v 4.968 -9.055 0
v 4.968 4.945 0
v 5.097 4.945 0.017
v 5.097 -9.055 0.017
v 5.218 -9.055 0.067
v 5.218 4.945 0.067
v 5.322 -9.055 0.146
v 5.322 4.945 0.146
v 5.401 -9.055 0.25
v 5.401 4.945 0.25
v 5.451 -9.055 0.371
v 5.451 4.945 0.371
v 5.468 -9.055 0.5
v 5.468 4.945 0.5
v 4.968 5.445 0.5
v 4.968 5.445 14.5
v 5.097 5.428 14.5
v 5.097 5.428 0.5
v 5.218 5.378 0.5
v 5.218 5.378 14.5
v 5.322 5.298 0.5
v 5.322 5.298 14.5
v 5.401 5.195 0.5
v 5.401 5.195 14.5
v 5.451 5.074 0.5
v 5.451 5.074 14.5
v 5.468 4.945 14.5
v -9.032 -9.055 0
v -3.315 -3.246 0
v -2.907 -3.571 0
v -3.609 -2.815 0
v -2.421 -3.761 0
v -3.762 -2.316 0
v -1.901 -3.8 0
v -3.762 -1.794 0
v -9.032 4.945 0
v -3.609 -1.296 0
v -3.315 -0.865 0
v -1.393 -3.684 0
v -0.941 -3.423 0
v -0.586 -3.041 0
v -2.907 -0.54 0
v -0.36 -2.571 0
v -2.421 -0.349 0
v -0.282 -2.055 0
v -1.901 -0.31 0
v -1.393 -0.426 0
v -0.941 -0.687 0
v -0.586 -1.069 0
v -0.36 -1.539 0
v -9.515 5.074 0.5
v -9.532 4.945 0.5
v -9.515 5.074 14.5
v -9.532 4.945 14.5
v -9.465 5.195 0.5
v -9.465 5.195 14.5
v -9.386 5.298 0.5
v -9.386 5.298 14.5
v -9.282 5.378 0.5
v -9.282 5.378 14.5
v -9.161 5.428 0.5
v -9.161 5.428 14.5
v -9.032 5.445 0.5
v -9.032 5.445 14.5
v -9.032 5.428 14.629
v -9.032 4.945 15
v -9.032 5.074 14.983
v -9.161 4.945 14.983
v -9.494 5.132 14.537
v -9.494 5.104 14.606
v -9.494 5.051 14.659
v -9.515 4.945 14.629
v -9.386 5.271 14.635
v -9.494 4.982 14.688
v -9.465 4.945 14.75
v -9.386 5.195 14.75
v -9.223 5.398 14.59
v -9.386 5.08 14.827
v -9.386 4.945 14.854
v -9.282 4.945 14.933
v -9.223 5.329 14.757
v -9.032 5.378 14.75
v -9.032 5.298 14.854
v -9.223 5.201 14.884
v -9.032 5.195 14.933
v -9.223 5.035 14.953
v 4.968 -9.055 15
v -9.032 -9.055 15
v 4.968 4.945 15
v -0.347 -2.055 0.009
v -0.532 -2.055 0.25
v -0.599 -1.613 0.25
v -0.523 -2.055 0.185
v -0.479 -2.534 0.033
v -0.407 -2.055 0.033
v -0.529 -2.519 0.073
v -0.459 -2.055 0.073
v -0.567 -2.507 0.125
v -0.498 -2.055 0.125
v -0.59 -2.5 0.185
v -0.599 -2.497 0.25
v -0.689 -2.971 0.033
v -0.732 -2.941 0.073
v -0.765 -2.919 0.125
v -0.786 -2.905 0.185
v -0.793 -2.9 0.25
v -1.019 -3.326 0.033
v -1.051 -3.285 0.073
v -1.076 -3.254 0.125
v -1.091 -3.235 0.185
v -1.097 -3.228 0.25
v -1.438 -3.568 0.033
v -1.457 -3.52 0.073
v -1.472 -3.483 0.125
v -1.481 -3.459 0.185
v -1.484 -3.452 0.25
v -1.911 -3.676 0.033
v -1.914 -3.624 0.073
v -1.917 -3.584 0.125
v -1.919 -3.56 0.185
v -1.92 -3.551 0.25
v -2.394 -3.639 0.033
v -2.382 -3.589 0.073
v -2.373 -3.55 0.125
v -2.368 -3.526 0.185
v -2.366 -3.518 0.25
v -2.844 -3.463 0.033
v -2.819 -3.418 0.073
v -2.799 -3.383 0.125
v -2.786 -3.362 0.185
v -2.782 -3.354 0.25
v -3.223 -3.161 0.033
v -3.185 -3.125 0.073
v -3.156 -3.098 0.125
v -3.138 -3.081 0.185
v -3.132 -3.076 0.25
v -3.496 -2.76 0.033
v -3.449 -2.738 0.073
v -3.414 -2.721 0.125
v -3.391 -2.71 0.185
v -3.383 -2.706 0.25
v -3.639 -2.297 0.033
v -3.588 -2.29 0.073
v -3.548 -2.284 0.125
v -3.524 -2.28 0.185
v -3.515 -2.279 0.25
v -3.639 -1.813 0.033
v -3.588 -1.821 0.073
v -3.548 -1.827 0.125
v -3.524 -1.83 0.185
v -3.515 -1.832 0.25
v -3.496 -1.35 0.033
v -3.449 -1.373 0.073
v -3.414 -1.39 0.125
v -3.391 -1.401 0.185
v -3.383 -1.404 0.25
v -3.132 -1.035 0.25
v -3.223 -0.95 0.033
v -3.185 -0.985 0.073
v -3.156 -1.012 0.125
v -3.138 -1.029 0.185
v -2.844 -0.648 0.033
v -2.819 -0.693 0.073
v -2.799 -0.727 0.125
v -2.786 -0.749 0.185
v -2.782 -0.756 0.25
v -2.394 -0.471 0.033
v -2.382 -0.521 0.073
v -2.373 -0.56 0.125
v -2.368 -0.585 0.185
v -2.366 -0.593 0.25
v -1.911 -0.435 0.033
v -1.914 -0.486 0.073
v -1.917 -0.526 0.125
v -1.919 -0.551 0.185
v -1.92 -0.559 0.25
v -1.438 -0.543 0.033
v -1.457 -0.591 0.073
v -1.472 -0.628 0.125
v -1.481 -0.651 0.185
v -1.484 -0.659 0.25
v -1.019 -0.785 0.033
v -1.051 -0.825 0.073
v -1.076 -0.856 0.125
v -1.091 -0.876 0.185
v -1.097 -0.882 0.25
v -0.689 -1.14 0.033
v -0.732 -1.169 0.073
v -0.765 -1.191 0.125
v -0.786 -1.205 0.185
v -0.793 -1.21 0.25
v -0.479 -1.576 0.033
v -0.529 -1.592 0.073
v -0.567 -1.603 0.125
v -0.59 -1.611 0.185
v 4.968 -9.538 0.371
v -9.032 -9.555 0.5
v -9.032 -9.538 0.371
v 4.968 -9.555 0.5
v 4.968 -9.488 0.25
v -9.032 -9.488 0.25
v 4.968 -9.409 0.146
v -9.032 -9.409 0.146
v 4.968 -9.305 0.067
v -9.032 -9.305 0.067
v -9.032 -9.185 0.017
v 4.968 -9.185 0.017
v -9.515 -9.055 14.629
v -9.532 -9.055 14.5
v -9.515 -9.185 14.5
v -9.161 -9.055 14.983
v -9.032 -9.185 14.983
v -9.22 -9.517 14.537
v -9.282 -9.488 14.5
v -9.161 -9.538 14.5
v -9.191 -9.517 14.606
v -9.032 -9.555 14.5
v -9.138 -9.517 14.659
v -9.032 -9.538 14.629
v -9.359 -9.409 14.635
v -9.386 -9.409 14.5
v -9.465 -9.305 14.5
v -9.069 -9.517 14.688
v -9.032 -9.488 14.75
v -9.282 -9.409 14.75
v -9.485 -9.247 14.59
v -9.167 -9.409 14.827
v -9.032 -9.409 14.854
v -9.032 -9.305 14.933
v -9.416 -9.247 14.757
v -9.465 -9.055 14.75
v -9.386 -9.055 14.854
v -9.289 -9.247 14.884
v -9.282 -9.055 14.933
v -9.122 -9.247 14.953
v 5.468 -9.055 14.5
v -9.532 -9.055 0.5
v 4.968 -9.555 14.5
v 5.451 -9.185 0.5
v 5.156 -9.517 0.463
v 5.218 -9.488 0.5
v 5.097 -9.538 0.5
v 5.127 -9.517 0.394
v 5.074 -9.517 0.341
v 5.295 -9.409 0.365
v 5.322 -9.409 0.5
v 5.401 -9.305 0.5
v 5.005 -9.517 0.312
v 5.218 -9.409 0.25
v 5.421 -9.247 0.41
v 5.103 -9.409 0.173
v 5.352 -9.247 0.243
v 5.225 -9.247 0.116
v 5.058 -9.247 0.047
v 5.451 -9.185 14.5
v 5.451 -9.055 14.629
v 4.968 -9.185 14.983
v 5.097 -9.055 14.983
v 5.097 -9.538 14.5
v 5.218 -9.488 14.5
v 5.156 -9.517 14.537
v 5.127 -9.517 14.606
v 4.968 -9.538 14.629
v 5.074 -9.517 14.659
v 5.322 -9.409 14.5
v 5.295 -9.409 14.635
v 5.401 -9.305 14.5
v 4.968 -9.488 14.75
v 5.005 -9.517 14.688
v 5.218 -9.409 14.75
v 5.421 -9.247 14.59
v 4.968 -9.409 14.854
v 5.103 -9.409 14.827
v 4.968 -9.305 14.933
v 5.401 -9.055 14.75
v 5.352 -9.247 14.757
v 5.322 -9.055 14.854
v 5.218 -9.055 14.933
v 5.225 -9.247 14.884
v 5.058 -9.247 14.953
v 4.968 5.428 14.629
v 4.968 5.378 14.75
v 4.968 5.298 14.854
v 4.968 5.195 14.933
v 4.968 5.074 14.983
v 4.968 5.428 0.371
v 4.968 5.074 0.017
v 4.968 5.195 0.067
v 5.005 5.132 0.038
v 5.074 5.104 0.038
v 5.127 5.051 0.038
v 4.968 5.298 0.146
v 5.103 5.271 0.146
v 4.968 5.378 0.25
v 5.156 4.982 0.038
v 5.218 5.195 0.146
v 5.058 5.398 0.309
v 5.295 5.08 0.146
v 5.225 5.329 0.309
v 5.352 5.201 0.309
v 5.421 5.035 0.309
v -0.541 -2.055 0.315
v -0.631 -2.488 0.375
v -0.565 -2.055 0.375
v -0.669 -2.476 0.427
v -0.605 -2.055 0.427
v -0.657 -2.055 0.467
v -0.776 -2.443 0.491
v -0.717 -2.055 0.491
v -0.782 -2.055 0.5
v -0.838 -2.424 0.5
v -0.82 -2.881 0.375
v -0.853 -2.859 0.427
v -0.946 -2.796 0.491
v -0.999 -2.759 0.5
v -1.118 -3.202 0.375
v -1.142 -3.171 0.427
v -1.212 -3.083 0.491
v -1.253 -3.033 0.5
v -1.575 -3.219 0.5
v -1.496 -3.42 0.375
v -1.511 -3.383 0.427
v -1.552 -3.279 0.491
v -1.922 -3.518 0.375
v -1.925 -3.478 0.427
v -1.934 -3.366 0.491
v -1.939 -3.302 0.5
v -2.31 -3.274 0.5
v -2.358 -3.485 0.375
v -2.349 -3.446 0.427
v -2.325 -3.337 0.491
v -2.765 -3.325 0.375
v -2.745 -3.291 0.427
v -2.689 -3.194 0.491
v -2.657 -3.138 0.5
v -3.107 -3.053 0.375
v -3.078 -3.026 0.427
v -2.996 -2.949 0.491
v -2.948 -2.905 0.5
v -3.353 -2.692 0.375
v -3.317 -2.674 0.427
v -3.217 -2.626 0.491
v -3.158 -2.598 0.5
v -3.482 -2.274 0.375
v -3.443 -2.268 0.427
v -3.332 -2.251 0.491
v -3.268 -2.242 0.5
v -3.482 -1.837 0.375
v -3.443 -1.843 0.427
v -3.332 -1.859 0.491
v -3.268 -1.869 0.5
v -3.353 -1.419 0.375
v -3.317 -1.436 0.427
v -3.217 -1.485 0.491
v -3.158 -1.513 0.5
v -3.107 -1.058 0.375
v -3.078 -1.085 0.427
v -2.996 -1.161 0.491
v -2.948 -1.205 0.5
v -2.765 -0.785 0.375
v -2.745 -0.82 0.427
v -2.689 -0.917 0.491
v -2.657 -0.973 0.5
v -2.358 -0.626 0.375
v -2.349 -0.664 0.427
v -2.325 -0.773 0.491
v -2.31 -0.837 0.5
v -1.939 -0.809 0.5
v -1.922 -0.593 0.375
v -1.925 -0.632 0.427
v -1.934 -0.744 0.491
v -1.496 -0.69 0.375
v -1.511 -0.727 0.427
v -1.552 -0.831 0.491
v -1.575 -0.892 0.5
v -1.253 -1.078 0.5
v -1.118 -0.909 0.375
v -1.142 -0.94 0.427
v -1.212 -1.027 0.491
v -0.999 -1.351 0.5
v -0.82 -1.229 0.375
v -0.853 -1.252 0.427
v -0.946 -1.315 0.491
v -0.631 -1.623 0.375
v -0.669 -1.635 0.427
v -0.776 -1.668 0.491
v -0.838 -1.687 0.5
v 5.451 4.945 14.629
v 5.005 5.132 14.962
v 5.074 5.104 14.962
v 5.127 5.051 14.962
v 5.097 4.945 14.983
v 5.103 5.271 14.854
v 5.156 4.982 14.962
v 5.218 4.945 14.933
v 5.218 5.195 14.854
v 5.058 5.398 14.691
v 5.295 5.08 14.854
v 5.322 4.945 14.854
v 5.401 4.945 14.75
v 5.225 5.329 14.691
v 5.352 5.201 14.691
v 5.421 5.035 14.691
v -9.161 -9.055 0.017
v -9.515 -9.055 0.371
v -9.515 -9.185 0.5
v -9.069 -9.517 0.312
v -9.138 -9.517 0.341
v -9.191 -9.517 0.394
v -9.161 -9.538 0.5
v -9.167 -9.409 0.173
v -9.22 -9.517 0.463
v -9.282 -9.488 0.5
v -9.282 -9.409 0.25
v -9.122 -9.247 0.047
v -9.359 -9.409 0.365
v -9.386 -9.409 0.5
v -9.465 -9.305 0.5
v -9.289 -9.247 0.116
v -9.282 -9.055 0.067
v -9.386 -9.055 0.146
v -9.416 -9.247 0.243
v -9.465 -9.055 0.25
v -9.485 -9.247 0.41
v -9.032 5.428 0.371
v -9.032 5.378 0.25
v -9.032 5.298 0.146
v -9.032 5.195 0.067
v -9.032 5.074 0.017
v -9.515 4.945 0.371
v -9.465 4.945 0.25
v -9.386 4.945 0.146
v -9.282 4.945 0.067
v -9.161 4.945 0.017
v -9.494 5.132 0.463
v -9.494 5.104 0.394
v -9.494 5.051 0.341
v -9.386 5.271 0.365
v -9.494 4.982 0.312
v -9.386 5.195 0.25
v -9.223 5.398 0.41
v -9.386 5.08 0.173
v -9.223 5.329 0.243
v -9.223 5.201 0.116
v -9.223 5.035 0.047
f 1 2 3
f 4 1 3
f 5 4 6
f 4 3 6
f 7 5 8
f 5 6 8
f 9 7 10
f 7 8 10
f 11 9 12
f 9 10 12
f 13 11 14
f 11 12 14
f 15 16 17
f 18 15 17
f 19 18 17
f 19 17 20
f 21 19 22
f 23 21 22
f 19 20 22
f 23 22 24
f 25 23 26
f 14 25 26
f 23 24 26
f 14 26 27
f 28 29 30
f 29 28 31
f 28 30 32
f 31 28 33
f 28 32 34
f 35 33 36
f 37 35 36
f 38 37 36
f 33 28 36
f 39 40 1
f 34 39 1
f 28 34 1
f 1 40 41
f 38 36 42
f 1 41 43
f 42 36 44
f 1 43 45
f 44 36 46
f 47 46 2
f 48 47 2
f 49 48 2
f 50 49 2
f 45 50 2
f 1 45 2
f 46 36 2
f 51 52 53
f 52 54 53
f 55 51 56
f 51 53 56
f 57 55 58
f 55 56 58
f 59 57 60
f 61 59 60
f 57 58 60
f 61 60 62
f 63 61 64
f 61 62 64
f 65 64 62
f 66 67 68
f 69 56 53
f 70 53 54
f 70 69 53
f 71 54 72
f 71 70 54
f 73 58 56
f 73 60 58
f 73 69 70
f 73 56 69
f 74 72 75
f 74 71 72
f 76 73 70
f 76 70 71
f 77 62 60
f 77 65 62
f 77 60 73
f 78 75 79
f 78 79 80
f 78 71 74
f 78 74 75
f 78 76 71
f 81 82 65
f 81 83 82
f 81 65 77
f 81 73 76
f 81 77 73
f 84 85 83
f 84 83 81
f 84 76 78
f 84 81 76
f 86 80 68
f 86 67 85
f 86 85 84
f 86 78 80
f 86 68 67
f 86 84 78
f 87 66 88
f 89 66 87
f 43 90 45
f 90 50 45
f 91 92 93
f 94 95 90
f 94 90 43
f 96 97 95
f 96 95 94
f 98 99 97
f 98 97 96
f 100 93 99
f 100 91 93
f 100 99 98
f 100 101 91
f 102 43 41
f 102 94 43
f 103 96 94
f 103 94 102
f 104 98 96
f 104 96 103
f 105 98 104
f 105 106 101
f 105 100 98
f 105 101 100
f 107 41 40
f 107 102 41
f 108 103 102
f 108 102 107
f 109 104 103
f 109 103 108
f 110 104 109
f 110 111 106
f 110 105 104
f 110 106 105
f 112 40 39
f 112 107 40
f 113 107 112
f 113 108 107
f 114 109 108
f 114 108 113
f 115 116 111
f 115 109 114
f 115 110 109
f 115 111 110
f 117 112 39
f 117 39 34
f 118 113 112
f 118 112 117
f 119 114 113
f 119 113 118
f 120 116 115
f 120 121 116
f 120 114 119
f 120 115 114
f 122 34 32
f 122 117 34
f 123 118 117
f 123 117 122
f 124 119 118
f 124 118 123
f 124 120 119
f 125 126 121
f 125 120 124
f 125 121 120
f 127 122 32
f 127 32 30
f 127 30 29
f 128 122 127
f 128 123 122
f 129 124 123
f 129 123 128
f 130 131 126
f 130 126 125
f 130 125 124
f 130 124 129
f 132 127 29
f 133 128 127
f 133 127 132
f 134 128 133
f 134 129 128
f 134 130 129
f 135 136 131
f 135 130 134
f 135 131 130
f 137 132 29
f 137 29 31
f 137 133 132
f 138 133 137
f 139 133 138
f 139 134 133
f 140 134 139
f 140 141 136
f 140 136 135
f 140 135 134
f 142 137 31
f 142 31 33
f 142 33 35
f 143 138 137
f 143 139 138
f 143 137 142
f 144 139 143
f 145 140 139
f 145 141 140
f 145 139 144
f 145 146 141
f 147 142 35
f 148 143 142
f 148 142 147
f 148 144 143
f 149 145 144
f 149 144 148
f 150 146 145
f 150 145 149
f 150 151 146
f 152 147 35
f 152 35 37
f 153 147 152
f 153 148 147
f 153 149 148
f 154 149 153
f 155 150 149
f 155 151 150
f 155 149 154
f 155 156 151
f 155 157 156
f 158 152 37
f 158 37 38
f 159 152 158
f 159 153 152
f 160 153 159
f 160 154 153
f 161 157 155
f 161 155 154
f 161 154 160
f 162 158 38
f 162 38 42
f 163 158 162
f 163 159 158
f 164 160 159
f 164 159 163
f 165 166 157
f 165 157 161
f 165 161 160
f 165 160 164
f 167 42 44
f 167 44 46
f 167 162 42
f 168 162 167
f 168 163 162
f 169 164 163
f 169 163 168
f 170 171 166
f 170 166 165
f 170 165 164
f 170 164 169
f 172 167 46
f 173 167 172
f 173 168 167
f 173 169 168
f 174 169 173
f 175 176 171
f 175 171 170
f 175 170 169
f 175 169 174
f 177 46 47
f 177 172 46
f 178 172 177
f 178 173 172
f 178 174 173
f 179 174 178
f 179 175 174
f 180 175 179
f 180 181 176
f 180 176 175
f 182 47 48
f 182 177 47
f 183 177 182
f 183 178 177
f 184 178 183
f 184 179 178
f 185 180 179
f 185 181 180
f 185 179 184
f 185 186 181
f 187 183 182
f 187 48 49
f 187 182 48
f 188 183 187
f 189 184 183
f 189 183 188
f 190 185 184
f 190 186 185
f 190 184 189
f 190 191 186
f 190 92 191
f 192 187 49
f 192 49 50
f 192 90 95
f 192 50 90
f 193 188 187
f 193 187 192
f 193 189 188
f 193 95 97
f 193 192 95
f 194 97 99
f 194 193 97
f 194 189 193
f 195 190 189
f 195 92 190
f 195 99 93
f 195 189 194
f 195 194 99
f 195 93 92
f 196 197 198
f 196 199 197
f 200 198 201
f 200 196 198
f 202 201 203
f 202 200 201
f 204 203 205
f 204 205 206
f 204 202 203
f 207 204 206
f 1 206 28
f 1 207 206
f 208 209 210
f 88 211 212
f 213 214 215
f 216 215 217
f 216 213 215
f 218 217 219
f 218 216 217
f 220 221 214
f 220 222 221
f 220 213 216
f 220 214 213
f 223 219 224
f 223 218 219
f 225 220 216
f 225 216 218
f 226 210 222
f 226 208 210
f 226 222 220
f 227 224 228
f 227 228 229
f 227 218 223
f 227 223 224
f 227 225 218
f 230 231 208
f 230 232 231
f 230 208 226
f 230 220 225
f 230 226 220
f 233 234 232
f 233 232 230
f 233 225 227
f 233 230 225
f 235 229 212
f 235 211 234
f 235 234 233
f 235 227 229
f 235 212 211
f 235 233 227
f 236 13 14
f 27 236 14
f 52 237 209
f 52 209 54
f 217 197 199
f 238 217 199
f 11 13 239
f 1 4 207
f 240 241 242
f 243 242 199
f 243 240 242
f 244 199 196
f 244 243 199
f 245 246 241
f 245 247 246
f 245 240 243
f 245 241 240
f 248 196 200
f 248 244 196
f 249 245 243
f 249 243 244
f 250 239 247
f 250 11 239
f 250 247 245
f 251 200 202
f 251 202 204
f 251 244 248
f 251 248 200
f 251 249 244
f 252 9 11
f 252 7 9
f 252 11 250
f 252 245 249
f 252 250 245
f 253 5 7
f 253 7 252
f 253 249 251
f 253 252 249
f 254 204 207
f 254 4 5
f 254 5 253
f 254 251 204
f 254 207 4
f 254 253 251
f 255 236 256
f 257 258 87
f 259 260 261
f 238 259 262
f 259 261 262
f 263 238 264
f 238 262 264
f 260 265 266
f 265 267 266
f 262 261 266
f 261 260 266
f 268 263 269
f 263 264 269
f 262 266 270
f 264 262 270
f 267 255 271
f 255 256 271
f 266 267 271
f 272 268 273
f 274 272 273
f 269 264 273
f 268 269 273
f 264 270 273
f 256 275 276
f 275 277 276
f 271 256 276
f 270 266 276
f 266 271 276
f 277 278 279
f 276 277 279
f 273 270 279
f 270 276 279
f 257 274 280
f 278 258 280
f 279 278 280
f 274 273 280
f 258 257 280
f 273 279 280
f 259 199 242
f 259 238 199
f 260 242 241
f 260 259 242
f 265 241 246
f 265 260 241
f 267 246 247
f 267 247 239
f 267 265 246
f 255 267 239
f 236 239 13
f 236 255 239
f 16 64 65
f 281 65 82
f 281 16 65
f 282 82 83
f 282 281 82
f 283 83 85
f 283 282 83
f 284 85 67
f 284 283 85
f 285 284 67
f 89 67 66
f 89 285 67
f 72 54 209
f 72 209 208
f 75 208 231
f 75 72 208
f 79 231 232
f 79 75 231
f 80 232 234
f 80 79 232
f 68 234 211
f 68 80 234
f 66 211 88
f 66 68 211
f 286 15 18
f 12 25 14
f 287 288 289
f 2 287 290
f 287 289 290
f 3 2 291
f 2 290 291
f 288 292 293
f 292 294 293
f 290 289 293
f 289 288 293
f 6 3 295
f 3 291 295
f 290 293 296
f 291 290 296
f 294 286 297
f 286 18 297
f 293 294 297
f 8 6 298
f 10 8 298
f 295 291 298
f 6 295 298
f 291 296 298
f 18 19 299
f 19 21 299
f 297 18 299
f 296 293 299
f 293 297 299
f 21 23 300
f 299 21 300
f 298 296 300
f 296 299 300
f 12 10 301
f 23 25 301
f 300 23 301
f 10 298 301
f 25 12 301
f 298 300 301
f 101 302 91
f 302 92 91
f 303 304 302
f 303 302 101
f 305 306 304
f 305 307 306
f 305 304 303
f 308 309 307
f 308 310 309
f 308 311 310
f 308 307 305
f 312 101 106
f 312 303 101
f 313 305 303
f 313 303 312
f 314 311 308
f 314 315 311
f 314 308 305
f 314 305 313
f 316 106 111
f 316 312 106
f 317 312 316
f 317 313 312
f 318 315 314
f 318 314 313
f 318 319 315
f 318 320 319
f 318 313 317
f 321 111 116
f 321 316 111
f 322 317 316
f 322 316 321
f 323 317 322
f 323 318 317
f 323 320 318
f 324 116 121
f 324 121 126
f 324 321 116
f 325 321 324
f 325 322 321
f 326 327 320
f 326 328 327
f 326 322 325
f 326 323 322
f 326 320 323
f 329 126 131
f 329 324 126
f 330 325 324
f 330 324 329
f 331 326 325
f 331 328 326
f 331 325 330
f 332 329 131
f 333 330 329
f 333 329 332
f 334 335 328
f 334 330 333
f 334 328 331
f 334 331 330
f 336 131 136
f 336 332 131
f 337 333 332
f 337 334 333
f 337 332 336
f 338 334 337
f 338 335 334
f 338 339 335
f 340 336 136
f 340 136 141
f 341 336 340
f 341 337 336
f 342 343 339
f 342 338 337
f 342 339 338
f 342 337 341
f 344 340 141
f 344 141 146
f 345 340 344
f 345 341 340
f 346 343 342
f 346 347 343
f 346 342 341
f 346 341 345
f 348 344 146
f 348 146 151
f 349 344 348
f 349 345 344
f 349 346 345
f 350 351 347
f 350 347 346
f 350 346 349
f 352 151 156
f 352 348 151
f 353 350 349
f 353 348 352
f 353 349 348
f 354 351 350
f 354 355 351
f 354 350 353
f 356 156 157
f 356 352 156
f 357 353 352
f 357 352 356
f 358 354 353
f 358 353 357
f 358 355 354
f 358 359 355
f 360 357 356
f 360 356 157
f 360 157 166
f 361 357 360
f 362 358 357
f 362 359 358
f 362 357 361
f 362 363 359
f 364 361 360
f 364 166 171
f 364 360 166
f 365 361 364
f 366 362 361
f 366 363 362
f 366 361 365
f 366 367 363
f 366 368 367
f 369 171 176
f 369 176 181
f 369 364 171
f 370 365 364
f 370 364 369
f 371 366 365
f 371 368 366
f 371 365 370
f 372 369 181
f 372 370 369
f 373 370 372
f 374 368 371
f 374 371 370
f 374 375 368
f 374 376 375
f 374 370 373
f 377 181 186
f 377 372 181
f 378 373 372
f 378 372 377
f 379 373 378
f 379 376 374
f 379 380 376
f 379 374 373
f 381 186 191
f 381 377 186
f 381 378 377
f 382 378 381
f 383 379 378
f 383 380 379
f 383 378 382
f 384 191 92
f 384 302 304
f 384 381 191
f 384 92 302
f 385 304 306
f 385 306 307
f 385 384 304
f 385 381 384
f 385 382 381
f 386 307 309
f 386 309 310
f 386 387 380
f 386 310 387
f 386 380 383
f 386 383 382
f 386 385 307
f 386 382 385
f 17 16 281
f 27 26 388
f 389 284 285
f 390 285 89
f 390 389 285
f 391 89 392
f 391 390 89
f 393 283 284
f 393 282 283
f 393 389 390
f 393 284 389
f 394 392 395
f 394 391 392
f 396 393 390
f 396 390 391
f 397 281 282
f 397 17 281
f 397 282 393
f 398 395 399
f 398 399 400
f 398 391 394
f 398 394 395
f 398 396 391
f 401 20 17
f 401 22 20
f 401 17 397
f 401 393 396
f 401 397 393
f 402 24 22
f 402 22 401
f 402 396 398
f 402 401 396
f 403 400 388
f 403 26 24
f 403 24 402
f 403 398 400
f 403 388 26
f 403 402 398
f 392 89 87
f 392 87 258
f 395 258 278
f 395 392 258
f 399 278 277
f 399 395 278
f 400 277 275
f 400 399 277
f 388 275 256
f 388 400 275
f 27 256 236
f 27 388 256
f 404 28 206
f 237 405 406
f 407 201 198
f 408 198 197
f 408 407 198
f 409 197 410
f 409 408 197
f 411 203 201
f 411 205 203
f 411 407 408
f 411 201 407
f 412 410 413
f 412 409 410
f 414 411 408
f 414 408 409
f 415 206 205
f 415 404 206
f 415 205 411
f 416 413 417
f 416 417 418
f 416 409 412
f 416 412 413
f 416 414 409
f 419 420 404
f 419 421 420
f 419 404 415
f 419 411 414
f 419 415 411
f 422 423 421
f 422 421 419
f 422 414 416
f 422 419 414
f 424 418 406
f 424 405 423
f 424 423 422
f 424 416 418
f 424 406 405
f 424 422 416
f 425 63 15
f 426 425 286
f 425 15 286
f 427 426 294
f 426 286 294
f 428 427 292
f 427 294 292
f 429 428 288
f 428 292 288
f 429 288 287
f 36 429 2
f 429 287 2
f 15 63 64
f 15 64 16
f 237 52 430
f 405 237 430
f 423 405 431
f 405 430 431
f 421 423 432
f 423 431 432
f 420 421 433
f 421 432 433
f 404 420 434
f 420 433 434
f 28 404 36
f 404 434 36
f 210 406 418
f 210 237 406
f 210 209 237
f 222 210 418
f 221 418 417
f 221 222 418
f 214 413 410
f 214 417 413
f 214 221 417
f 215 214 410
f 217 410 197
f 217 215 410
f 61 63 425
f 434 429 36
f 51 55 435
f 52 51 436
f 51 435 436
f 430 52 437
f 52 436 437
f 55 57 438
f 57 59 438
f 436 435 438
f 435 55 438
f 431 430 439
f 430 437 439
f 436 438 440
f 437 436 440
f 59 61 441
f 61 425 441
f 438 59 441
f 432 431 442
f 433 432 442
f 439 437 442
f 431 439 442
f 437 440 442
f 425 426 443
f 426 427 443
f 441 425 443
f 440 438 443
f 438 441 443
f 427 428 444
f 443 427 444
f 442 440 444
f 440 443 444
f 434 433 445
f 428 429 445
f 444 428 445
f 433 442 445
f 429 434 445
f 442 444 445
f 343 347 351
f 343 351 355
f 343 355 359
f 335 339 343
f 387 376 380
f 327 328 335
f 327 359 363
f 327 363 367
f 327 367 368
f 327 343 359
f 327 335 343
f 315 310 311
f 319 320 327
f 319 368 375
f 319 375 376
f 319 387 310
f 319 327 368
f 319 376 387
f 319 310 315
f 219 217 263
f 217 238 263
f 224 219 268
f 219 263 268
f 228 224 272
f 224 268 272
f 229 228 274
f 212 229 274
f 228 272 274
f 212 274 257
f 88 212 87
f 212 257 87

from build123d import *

# Parameters (mm, degrees)
F0_W     = 15
F0_H     = 15
F1_DEPTH = 15
F2_R     = 1.5
F3_DEPTH = 0.5
F4_R     = 0.5
F5_R     = 0.24999


# Not quite as in the source:
# - a fillet or chamfer is up to 0.001 mm smaller than in the source, because OpenCascade refuses the exact size
# - a feature names something its author has since deleted; it is built from what else it names


with BuildPart() as f1:
    # F0 (on Top) → F1 (new body)
    with BuildSketch(Plane.XY):
        with Locations((-2.0319856703, -2.0552466768)):
            Rectangle(F0_W, F0_H)
    extrude(amount=F1_DEPTH)

    # F2 (on face) → F3 (cut)
    with BuildSketch(Plane(origin=(0, 0, 0), x_dir=(1, 0, 0), z_dir=(0, 0, -1))):
        with Locations((-2.0319856703, 2.0552456845)):
            Circle(F2_R)
    extrude(amount=-F3_DEPTH, mode=Mode.SUBTRACT)

    # F4
    f4_edges = [f1.edges().sort_by_distance(p)[0] for p in [
        (5.468014, 5.444753, 7.5),
        (-2.031986, 5.444753, 0),
        (-2.031986, 5.444753, 15),
        (-9.531986, 5.444753, 7.5),
        (5.468014, -2.055247, 0),
        (5.468014, -2.055247, 15),
        (5.468014, -9.555247, 7.5),
        (-9.531986, -2.055247, 0),
        (-2.031986, -9.555247, 0),
        (-9.531986, -2.055247, 15),
        (-9.531986, -9.555247, 7.5),
        (-2.031986, -9.555247, 15),
    ]]
    fillet(f4_edges, radius=F4_R)

    # F5 (radius 0.25 in the source; OpenCascade refuses exactly that, so slightly less here)
    f5_edges = [f1.edges().sort_by_distance(p)[0] for p in [
        (-3.531986, -2.055246, 0.5),
        (-3.531986, -2.055246, 0),
    ]]
    fillet(f5_edges, radius=F5_R)


solid = f1.part
